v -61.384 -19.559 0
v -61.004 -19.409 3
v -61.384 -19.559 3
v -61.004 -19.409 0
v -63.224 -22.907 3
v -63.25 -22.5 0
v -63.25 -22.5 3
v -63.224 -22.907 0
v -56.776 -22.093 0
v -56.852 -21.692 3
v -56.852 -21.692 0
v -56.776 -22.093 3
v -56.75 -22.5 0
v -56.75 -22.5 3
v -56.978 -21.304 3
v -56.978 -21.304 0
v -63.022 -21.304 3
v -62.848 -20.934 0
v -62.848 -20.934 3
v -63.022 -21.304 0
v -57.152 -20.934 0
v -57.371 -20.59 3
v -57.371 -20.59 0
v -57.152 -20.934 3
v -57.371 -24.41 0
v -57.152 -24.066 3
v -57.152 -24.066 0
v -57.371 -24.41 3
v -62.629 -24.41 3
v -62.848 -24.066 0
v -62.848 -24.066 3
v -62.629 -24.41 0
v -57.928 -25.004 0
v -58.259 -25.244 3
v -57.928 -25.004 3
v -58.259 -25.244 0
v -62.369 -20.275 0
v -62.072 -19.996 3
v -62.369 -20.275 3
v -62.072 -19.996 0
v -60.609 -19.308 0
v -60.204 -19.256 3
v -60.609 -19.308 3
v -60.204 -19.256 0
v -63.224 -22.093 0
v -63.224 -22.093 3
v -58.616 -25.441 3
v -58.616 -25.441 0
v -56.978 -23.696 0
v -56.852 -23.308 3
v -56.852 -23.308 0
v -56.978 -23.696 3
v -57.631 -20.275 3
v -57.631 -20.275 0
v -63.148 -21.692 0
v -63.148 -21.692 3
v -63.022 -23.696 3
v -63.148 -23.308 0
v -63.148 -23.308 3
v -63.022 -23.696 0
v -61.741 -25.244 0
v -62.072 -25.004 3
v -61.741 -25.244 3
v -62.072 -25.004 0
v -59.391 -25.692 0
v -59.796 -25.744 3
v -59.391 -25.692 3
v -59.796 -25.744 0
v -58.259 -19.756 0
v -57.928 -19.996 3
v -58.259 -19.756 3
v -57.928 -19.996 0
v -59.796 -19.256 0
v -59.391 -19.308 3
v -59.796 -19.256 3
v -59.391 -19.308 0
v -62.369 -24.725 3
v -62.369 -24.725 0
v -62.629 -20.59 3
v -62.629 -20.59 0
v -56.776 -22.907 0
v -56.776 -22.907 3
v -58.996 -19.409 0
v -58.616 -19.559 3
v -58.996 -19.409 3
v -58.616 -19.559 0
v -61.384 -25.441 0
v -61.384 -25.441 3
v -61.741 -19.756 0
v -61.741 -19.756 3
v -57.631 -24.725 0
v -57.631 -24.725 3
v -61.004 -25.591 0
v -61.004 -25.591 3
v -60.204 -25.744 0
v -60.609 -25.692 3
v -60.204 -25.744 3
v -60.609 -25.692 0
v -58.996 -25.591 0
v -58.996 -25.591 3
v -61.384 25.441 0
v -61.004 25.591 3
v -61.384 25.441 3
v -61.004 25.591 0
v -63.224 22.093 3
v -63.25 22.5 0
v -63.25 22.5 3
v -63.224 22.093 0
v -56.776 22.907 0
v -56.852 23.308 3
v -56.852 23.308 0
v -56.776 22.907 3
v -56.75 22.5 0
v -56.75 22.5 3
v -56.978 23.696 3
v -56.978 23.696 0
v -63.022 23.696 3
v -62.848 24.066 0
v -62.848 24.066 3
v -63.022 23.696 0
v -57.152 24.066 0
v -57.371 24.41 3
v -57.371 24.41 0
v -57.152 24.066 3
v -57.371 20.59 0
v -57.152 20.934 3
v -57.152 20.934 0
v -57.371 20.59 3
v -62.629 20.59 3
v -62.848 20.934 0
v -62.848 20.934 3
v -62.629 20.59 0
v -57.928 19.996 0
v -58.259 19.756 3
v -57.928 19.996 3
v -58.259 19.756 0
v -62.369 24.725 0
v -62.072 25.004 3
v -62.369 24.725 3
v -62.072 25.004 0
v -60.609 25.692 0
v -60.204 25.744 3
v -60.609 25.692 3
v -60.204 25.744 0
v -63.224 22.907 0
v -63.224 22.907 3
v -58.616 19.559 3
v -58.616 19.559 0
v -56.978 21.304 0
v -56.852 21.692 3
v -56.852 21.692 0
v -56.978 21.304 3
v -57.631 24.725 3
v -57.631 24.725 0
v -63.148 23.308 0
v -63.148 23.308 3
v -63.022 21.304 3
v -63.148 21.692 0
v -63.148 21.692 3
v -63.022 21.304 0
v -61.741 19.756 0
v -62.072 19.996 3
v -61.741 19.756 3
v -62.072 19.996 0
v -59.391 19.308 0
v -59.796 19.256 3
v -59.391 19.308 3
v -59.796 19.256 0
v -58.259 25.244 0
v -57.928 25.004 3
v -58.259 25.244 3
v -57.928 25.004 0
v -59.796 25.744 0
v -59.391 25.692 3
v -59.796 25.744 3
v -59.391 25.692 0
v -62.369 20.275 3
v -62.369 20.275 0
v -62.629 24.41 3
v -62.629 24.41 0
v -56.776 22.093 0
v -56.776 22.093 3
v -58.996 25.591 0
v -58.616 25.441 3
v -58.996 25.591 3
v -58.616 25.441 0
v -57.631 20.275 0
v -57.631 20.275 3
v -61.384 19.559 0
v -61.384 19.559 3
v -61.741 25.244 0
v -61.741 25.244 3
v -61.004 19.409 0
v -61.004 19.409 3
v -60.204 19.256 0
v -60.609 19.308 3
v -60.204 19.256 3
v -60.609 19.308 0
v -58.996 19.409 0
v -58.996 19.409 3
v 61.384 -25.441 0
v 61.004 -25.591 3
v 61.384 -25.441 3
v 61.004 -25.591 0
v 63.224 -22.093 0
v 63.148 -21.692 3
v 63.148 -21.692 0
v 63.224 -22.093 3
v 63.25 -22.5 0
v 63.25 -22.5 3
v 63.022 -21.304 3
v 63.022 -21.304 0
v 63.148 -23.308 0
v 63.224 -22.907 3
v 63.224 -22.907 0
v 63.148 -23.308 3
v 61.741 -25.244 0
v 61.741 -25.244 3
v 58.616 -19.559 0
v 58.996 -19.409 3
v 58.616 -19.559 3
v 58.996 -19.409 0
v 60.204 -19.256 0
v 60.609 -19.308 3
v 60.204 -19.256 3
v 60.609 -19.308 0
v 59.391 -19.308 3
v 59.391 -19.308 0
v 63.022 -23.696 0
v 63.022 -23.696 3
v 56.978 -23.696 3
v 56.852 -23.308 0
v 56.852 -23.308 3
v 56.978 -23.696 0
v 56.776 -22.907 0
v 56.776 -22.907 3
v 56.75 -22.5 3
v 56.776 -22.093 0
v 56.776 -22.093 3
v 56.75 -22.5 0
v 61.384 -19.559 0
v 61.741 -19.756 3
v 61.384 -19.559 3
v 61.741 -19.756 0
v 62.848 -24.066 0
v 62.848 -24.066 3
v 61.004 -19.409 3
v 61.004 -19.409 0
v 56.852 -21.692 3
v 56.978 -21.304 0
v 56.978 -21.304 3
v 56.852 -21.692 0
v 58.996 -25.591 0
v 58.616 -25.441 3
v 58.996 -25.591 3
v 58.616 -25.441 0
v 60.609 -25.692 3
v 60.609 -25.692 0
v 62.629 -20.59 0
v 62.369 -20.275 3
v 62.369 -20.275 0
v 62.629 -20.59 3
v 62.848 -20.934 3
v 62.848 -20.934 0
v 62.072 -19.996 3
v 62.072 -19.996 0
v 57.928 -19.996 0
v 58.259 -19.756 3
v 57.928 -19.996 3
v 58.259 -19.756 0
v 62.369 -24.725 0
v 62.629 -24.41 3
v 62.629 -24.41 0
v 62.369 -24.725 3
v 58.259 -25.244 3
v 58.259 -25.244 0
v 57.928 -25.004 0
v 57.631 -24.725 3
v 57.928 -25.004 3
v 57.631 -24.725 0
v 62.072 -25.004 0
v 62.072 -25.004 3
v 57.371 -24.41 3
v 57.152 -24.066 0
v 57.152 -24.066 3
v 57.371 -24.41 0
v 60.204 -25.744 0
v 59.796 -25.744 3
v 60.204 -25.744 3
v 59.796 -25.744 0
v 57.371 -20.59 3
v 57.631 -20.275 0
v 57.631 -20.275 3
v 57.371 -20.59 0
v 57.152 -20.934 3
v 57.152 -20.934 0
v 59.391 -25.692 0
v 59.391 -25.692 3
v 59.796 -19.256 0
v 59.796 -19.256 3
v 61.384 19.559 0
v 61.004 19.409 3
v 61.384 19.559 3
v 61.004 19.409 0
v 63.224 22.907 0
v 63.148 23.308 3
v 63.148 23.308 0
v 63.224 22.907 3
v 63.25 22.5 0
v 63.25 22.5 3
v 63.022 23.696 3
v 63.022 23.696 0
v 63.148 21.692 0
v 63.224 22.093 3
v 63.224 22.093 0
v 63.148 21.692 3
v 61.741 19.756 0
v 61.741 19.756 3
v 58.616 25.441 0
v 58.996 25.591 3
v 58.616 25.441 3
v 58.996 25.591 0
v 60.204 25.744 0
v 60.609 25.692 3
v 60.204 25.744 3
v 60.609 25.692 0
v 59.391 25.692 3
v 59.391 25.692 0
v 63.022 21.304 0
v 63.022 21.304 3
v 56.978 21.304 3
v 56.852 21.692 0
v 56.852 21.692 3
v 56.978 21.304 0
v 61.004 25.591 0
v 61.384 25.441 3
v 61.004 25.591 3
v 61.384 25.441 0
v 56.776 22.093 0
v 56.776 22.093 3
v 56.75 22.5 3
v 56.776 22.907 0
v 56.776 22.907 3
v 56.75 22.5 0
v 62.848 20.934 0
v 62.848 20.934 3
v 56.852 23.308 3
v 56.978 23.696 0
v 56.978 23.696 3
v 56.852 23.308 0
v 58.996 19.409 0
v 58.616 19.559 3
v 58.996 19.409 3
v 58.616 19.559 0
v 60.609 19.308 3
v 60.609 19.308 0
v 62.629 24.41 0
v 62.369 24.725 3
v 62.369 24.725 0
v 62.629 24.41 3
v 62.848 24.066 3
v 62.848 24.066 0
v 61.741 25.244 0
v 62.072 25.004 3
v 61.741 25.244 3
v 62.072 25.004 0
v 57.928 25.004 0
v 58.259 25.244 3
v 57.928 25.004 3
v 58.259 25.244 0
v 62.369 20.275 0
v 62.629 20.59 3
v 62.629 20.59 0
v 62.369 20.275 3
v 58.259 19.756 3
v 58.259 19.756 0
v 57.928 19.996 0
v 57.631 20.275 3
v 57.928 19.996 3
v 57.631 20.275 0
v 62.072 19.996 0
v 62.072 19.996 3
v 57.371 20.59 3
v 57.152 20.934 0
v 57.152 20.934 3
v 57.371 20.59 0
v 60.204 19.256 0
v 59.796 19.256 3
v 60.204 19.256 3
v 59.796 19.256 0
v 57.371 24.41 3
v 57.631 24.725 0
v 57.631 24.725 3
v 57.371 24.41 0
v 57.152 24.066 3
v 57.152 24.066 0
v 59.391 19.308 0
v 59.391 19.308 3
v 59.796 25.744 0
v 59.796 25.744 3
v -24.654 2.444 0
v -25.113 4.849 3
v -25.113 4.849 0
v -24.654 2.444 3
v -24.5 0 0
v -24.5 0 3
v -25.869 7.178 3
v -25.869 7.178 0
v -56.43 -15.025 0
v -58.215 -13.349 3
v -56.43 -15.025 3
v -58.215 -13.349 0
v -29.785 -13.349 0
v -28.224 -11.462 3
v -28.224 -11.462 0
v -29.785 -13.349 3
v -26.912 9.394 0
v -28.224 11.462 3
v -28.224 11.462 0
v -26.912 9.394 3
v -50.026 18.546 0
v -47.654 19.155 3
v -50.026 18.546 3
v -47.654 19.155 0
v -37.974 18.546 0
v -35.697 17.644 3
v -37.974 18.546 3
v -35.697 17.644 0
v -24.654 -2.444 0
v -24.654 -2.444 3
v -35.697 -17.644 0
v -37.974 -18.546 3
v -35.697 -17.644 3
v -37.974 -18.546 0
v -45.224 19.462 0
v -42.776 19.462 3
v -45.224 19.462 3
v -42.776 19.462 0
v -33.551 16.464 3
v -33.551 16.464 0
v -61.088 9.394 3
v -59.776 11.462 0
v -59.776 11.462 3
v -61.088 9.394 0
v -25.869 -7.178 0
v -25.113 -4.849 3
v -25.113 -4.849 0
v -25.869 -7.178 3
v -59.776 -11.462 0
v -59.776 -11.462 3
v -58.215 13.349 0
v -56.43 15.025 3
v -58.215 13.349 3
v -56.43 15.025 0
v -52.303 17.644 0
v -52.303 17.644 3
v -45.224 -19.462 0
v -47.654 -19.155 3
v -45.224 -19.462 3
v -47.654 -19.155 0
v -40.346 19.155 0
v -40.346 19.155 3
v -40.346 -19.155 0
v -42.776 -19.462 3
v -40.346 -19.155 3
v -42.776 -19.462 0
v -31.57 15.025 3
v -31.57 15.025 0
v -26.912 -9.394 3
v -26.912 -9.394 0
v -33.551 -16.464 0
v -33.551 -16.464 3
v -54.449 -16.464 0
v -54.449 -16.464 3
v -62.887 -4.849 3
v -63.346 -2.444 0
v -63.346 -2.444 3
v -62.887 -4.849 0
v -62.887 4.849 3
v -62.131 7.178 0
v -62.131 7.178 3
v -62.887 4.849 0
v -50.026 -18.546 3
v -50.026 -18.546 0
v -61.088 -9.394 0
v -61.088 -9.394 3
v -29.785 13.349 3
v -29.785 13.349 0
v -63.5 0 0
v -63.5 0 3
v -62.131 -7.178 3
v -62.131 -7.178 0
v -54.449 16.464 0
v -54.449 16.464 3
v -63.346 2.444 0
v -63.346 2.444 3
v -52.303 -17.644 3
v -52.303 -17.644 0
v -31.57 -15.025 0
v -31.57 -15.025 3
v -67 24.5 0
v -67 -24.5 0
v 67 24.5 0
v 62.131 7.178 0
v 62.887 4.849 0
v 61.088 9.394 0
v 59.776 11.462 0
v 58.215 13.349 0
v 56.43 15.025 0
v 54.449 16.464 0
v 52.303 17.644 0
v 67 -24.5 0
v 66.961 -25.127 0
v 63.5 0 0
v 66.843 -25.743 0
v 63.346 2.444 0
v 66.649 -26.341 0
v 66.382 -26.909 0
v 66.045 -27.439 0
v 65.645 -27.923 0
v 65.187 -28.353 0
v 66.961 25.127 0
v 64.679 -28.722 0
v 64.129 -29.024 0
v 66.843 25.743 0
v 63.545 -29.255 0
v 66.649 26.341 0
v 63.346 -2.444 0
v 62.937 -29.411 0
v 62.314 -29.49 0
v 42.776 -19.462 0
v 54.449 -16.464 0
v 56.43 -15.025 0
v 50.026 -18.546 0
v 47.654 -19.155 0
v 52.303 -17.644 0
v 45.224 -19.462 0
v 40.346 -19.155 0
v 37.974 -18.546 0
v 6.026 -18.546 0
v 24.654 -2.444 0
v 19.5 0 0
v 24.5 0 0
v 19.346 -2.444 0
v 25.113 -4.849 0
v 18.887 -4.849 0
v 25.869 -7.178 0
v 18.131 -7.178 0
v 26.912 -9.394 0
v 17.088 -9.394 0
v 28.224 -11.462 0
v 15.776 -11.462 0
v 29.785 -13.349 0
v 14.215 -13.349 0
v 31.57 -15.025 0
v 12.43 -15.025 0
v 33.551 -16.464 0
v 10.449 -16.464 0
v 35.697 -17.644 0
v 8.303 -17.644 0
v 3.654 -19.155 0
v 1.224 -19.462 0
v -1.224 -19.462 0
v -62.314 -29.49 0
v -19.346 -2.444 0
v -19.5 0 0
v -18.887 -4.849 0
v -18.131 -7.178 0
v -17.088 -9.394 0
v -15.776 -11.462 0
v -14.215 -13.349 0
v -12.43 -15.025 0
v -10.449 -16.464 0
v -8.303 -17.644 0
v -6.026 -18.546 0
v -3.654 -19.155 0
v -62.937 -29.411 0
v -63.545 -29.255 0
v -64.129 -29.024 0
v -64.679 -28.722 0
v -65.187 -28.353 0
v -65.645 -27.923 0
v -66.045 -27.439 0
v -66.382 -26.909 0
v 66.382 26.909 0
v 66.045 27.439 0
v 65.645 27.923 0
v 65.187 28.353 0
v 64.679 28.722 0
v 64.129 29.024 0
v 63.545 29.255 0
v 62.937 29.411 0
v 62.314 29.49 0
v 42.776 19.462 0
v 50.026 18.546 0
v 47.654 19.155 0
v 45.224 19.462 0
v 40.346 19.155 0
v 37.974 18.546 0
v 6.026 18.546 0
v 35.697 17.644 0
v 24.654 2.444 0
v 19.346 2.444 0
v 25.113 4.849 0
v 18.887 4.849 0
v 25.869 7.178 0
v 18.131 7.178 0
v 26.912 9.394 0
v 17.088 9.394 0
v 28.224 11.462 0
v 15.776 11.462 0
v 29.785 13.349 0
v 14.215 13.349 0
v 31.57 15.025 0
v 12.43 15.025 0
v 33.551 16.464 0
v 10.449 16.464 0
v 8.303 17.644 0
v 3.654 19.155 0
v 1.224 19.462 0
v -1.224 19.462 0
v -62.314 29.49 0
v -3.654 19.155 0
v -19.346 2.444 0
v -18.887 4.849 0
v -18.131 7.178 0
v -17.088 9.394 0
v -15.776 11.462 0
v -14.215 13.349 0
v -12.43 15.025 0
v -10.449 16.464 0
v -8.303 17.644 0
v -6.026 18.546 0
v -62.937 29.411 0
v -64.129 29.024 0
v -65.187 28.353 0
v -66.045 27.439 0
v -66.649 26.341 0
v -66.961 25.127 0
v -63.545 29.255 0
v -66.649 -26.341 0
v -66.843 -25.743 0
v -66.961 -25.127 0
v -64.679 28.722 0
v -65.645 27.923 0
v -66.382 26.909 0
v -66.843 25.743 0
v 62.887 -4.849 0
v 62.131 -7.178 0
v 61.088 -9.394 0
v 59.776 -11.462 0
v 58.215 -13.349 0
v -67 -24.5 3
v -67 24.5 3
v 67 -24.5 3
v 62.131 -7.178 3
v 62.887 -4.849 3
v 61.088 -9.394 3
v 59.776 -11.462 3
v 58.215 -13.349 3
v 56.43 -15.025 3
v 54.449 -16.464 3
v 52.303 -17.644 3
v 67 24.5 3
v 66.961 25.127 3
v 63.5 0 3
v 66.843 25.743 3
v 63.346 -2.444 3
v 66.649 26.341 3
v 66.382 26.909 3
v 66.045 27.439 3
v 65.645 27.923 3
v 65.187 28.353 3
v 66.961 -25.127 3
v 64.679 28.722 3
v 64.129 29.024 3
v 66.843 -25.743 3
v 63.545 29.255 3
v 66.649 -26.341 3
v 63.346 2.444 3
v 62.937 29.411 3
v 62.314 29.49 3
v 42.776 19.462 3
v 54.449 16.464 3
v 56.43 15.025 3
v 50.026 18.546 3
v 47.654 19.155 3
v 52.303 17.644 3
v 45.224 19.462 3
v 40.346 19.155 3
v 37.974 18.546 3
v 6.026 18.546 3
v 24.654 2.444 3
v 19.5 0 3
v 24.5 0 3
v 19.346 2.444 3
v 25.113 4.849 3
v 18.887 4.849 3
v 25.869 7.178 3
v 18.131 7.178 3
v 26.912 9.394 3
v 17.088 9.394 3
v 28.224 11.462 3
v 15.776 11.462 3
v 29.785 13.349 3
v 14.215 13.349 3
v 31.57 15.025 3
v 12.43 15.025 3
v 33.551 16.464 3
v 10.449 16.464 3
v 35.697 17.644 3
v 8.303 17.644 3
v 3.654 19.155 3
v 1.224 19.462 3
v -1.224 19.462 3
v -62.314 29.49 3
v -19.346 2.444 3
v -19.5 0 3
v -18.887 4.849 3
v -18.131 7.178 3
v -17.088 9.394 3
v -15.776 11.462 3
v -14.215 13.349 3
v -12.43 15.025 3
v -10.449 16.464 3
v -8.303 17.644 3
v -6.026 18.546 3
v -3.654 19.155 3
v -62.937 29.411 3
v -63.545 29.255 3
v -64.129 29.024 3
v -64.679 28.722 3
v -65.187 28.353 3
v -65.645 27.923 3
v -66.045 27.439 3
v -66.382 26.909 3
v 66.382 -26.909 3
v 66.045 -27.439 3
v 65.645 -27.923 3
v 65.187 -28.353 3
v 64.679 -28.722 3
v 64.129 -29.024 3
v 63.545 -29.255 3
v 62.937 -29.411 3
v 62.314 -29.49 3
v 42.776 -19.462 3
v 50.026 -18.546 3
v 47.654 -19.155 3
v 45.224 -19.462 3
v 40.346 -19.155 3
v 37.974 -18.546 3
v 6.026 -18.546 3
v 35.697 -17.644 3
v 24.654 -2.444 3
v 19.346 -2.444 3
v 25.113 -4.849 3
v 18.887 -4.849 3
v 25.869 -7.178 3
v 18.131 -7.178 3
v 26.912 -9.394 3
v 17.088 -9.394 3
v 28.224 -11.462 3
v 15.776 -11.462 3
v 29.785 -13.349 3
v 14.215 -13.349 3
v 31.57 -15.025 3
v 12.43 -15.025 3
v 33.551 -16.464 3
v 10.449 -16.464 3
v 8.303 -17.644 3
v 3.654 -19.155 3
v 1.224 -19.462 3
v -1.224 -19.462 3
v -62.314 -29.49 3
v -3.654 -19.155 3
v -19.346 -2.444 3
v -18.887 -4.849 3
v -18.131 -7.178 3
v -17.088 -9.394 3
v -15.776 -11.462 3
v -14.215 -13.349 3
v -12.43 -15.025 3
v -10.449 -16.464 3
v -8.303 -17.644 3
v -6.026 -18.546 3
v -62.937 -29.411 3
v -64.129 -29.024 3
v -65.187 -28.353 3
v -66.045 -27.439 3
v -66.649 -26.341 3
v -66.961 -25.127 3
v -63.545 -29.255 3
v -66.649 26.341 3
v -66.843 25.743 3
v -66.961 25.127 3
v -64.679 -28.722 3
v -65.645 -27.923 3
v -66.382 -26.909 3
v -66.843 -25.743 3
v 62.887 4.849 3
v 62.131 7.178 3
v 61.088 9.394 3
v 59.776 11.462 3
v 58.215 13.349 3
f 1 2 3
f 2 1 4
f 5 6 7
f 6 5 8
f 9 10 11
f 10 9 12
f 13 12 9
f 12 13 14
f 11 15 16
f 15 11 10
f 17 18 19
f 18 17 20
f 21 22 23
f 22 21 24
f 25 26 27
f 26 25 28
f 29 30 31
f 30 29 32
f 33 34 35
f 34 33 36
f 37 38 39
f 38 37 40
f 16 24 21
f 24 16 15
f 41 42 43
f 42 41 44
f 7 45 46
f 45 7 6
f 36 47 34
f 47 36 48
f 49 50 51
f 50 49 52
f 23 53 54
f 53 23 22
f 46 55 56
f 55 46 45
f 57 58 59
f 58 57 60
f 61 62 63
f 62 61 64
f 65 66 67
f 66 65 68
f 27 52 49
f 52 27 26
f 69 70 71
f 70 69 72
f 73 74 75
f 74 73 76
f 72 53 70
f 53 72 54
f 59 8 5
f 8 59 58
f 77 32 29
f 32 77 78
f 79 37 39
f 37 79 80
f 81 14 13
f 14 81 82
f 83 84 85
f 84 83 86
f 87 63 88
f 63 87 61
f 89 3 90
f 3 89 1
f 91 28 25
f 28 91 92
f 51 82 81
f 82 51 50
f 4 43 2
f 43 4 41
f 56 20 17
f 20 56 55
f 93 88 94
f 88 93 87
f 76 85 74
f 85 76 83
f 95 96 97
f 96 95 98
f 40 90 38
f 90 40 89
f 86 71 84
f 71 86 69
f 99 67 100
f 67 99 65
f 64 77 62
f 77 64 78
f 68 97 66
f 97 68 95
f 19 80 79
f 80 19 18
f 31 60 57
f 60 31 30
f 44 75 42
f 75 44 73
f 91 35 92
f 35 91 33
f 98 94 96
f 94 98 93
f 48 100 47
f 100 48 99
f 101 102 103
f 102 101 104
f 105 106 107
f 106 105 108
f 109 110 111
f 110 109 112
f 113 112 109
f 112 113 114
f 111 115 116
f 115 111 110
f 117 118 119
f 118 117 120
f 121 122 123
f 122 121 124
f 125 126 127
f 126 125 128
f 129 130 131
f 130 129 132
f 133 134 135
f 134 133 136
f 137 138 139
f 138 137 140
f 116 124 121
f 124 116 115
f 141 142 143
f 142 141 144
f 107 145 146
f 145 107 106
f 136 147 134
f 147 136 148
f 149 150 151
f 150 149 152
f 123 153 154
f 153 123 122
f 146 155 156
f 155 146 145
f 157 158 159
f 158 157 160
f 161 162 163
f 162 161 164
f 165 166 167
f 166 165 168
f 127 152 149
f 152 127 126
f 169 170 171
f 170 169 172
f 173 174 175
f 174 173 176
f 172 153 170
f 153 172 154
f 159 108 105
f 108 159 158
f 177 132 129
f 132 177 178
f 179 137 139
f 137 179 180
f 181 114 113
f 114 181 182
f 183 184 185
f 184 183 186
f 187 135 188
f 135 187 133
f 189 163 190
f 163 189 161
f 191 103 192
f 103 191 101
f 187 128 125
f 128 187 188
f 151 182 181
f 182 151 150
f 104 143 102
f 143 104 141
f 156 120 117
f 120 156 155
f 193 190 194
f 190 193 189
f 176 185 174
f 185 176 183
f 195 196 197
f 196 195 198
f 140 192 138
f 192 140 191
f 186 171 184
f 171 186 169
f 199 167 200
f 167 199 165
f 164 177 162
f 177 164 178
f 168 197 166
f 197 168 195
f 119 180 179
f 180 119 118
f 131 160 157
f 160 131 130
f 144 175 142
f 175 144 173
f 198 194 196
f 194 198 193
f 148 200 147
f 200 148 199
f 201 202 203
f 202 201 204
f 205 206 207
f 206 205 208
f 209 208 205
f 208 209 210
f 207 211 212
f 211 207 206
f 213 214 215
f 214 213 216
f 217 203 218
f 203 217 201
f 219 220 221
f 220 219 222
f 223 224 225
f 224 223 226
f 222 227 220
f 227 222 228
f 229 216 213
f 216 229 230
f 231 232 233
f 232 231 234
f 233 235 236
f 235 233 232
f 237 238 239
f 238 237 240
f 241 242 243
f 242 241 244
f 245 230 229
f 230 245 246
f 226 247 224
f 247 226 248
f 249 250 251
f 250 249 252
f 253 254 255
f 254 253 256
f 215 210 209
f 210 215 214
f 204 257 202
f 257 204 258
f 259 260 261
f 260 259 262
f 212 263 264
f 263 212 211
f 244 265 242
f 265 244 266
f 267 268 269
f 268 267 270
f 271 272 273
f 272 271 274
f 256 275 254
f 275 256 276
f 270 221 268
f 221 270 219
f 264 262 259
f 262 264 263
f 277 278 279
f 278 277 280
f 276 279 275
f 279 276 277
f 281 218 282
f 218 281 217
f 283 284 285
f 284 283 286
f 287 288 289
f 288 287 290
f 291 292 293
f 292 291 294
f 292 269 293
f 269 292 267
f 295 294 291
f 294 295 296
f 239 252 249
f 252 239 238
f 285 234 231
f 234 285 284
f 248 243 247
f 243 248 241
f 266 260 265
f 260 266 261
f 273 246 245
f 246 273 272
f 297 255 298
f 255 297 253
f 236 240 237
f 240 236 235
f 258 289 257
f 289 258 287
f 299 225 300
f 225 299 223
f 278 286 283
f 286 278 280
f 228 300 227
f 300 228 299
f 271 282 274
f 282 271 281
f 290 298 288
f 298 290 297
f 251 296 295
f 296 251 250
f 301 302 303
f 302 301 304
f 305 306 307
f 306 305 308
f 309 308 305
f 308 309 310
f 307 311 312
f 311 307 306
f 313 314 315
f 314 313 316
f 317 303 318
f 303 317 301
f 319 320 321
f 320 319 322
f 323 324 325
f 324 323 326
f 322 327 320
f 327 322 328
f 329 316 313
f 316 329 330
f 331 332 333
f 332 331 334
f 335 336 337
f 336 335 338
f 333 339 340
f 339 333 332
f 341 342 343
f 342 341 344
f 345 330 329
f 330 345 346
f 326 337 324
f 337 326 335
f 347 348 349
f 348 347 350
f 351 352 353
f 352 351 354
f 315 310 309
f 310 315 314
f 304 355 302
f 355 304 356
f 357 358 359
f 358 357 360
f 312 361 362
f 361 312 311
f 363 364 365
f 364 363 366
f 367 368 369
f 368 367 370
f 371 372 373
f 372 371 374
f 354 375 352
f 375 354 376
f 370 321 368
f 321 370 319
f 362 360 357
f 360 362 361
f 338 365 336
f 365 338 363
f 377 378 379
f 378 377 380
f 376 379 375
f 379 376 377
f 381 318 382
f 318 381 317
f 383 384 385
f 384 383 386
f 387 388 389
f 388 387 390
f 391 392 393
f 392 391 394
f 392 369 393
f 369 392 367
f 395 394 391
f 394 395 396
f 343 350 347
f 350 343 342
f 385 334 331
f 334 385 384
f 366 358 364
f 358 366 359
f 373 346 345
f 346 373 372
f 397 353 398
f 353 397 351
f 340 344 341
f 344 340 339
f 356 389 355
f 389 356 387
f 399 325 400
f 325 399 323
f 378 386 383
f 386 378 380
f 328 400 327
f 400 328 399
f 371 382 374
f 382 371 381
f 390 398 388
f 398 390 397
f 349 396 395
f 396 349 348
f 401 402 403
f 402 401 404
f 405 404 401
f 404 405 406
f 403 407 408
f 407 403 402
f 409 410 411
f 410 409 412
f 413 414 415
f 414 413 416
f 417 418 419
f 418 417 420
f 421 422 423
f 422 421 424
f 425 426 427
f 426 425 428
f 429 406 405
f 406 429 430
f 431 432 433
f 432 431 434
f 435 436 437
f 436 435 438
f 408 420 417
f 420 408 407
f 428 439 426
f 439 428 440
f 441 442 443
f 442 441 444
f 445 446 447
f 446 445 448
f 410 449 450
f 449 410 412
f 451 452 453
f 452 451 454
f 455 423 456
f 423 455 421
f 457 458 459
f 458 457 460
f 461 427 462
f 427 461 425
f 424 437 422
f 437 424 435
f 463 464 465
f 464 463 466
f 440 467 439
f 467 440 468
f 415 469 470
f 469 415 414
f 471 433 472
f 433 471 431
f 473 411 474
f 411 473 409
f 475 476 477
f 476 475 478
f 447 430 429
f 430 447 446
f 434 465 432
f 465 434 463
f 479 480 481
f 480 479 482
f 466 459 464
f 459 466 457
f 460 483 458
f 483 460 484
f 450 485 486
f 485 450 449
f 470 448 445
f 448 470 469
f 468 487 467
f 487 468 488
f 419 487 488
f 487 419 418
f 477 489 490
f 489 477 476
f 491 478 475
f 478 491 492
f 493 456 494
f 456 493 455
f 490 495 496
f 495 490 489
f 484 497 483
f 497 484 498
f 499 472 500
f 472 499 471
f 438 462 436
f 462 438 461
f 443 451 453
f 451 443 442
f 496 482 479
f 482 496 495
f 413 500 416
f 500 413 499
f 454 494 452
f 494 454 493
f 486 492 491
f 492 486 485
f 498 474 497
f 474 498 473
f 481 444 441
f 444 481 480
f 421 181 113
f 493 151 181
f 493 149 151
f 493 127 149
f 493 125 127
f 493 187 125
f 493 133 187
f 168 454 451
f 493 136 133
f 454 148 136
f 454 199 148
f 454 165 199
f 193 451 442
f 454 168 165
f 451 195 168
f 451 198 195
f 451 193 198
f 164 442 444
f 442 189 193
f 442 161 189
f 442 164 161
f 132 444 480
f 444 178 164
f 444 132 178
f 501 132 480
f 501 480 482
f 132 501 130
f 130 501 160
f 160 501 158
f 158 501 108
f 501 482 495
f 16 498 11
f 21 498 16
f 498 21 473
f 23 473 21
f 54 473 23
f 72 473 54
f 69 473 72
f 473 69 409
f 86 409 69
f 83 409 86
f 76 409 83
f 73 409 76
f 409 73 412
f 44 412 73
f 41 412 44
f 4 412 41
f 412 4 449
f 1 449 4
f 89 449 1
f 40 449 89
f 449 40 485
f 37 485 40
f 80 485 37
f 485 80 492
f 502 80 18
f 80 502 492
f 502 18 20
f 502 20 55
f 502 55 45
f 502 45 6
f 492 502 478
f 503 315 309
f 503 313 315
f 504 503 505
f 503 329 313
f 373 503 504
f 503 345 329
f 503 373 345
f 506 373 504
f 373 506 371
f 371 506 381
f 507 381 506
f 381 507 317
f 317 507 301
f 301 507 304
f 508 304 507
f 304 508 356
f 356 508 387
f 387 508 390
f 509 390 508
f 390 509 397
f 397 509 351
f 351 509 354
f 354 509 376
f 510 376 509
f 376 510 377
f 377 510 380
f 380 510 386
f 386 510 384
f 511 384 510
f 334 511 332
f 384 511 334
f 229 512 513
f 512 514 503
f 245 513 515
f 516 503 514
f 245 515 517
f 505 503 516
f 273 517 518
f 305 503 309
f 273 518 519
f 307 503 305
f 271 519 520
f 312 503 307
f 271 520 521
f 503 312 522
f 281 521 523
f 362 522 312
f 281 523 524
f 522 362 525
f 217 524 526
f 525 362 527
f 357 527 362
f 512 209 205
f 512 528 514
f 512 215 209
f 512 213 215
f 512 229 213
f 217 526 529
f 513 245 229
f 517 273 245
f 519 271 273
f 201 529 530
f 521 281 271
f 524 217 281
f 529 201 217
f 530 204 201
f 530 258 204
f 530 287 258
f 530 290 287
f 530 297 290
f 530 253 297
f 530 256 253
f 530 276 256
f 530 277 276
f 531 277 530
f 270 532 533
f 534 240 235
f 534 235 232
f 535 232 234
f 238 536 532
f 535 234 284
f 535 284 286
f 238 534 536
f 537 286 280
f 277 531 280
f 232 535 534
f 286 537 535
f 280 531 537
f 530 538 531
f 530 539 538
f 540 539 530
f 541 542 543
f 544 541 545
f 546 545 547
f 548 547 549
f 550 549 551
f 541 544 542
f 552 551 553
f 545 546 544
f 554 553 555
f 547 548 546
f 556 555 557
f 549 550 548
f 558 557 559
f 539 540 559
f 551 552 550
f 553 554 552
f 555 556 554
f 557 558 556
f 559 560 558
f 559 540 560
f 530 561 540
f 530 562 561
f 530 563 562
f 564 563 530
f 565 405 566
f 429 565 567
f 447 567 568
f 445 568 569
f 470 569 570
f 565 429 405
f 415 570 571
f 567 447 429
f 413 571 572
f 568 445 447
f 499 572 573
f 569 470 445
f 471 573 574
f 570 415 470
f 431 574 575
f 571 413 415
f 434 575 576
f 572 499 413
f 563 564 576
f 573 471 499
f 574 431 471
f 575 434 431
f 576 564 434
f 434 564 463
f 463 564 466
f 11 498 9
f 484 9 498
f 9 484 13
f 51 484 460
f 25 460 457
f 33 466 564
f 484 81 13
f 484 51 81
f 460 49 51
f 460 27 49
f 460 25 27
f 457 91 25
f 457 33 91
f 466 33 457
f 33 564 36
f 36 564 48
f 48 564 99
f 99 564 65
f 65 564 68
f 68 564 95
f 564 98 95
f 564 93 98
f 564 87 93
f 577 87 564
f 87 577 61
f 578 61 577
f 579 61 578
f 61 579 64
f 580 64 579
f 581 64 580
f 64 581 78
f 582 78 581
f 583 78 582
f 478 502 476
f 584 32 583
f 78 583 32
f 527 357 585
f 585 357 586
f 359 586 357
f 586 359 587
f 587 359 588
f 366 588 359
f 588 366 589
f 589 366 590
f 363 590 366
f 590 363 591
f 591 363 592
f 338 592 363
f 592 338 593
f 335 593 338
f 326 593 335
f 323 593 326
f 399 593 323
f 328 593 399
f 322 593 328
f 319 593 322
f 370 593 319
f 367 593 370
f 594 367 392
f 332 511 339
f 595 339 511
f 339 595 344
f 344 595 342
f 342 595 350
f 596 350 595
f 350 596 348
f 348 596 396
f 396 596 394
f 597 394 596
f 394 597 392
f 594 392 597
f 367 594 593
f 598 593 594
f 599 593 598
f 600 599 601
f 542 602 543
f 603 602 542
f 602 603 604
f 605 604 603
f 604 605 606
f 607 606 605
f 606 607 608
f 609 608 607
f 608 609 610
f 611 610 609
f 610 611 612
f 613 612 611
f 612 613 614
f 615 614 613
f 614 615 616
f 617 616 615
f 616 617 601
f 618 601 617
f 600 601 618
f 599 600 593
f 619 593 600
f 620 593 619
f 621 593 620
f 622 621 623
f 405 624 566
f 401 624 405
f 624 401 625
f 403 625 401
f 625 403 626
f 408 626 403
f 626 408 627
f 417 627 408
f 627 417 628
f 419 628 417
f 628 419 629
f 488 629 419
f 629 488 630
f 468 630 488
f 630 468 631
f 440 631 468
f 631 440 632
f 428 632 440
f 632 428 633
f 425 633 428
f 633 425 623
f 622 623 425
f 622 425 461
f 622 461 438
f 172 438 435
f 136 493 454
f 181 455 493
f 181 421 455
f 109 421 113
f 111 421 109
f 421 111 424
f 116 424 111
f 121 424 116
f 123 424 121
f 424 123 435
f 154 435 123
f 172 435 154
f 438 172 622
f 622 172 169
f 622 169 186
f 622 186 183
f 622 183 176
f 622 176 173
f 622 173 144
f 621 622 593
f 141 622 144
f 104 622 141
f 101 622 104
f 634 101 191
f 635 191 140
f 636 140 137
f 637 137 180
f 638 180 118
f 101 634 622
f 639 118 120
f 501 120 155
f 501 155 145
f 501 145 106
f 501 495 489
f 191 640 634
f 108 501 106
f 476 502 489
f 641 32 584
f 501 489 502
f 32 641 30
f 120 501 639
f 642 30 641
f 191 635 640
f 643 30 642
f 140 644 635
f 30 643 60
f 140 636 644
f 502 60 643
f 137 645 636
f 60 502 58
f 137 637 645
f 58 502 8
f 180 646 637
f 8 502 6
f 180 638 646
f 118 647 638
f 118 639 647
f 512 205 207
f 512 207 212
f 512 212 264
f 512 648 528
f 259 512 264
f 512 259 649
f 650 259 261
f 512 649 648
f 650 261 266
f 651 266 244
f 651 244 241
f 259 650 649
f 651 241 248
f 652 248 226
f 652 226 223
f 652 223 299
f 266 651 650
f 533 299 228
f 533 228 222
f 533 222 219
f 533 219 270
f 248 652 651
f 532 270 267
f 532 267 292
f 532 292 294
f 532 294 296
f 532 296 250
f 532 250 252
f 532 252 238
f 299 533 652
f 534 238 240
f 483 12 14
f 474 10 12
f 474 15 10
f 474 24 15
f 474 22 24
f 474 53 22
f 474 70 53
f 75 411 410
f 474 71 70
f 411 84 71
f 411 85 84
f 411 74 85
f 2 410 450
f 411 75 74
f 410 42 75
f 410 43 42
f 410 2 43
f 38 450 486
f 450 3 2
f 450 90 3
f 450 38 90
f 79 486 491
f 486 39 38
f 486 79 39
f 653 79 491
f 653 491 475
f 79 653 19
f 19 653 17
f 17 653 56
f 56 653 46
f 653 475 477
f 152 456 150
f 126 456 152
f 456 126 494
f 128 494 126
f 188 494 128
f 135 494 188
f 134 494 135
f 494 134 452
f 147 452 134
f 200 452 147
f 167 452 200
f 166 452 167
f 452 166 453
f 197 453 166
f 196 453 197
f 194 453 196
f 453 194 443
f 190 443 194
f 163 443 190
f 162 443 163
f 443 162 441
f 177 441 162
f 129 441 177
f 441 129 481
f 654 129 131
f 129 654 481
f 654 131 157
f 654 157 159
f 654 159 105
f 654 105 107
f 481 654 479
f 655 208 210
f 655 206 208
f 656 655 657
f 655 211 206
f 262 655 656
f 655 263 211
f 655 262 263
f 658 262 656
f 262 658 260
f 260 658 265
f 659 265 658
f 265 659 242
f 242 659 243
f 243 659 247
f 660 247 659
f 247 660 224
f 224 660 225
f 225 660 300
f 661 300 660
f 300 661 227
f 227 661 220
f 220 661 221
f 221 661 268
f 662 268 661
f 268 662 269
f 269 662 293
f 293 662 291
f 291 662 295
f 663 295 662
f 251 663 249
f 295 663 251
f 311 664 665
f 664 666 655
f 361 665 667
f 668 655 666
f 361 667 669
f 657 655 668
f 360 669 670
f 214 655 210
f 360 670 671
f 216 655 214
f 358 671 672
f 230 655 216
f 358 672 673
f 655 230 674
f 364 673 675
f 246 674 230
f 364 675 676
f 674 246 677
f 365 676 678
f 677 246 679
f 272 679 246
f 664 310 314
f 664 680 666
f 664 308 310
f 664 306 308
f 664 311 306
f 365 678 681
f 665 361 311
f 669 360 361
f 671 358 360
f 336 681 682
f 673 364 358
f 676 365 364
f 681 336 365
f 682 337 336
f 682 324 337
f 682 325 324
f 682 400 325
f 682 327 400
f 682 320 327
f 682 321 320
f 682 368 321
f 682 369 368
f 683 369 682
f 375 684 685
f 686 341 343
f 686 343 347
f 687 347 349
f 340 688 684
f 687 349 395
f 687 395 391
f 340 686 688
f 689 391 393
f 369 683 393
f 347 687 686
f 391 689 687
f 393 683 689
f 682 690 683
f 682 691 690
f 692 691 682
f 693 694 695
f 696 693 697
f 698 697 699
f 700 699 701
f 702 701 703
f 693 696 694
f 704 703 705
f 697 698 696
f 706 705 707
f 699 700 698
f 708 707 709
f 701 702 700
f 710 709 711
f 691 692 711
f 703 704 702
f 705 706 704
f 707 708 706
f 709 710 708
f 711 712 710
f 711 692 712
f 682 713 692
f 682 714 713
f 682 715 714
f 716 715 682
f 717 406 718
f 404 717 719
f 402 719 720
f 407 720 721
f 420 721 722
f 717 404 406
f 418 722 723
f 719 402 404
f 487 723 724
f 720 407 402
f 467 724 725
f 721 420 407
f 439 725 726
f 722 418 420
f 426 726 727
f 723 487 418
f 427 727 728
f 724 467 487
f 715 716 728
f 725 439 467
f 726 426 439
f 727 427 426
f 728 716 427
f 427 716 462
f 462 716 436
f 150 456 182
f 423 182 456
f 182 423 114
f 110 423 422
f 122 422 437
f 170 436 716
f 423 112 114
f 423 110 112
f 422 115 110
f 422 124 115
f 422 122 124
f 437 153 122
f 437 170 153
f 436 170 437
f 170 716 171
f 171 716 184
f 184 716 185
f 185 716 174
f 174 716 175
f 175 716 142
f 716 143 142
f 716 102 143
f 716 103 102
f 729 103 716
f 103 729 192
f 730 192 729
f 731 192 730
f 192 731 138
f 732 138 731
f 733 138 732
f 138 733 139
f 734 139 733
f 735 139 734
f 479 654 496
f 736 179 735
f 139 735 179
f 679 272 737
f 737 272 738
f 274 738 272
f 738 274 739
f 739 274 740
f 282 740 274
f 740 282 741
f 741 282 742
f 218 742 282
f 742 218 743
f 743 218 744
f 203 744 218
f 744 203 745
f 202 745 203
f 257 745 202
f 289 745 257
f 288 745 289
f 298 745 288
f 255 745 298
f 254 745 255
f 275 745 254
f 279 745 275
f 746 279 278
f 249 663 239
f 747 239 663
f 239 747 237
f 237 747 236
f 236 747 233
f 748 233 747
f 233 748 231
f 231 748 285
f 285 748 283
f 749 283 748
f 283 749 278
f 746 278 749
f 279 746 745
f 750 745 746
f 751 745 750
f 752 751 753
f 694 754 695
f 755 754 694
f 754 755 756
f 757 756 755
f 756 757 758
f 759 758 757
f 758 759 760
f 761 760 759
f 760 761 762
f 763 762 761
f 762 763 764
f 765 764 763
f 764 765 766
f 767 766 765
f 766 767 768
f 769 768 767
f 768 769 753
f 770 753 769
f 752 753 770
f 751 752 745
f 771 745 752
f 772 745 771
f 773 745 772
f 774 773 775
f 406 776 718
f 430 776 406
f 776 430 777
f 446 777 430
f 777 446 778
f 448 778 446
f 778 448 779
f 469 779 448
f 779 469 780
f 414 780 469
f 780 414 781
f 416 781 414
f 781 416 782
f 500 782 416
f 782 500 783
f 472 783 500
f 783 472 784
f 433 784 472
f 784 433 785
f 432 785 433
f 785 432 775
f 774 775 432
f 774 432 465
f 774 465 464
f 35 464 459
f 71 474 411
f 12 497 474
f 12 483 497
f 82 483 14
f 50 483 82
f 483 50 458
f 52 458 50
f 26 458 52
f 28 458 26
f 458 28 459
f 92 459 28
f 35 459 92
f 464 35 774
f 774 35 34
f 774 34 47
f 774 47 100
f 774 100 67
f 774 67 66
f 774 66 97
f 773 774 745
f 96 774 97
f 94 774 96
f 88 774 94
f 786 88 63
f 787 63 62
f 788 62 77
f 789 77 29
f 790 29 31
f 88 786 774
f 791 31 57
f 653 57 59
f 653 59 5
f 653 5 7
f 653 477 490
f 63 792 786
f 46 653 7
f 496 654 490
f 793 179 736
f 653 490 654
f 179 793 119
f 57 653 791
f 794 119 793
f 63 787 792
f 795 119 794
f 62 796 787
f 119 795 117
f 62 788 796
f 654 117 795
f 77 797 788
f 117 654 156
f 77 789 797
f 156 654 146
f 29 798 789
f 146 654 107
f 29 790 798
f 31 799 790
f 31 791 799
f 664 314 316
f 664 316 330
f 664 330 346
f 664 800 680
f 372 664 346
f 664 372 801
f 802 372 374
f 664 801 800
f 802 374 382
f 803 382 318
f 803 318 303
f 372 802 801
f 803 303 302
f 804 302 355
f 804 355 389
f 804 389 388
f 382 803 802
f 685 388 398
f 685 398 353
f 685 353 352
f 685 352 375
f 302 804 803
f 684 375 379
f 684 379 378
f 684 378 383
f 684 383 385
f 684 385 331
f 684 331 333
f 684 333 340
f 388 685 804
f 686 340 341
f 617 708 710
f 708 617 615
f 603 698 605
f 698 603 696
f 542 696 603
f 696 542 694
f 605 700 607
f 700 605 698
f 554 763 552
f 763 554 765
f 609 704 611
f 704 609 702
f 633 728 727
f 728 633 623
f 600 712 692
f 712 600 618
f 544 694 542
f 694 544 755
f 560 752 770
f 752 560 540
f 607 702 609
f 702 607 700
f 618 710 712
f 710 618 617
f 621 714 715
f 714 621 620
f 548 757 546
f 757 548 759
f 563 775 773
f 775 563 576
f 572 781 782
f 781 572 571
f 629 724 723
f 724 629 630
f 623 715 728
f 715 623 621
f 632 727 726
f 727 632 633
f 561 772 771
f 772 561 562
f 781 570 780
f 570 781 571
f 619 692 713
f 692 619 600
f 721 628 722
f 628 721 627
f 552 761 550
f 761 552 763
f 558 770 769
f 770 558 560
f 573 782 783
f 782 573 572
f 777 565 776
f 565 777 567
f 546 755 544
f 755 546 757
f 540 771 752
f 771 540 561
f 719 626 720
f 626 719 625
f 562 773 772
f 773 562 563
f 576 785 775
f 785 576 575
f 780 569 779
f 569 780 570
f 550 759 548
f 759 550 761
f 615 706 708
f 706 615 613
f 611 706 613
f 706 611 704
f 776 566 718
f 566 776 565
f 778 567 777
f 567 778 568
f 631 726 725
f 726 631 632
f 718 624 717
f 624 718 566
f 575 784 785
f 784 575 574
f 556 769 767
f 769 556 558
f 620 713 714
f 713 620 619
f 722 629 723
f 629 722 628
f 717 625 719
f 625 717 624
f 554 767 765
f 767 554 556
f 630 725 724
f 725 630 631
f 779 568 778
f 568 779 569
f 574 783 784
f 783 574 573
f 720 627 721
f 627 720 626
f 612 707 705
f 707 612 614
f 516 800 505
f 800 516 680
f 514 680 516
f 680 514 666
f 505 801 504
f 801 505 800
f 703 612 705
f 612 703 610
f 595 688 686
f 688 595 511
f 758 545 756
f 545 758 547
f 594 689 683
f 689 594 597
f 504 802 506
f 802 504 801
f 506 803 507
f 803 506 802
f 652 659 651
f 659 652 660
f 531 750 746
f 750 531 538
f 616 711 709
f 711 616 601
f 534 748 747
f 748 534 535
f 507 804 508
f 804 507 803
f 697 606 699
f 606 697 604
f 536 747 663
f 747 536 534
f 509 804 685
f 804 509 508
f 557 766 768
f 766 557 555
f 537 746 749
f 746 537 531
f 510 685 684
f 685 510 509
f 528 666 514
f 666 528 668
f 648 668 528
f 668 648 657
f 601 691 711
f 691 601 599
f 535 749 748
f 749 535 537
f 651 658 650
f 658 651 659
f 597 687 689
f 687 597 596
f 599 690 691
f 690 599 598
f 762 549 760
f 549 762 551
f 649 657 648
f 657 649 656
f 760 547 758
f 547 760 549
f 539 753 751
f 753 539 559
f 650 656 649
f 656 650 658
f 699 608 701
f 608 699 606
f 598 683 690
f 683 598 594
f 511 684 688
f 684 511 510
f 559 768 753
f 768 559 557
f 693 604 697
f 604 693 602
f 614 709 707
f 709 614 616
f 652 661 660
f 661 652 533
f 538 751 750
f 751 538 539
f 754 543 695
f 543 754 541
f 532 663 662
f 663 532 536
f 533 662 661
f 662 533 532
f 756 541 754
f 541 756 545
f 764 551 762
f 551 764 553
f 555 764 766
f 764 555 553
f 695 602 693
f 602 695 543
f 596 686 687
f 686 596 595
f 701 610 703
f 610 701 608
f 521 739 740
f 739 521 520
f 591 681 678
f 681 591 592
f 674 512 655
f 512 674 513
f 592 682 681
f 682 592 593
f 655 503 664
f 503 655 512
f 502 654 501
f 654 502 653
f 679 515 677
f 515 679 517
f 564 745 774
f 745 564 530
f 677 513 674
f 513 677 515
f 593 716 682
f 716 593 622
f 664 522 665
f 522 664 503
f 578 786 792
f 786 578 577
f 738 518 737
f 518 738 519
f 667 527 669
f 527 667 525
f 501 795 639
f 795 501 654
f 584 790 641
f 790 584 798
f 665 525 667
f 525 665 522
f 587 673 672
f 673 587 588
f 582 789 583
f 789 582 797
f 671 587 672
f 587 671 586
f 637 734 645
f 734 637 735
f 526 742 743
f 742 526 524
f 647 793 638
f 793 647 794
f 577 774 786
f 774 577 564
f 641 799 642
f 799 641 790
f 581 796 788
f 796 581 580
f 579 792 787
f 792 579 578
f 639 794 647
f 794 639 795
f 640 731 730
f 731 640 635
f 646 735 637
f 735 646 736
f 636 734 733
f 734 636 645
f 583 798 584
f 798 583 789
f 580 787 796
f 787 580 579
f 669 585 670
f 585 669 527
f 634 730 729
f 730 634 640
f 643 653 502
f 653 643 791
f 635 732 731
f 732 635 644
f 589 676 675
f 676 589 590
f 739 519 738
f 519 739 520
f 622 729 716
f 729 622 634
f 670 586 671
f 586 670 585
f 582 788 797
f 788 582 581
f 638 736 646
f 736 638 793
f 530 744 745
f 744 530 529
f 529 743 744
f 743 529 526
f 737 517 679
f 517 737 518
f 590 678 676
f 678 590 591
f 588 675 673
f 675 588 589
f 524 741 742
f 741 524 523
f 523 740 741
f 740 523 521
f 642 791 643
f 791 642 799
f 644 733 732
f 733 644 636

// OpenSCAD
$fn = 50;


difference() {
	union() {
		hull() {
			translate(v = [-62.0000000000, 24.5000000000, 0]) {
				cylinder(h = 3, r = 5);
			}
			translate(v = [62.0000000000, 24.5000000000, 0]) {
				cylinder(h = 3, r = 5);
			}
			translate(v = [-62.0000000000, -24.5000000000, 0]) {
				cylinder(h = 3, r = 5);
			}
			translate(v = [62.0000000000, -24.5000000000, 0]) {
				cylinder(h = 3, r = 5);
			}
		}
	}
	union() {
		#translate(v = [-60.0000000000, -22.5000000000, -100.0000000000]) {
			cylinder(h = 200, r = 3.2500000000);
		}
		#translate(v = [-60.0000000000, 22.5000000000, -100.0000000000]) {
			cylinder(h = 200, r = 3.2500000000);
		}
		#translate(v = [60.0000000000, -22.5000000000, -100.0000000000]) {
			cylinder(h = 200, r = 3.2500000000);
		}
		#translate(v = [60.0000000000, 22.5000000000, -100.0000000000]) {
			cylinder(h = 200, r = 3.2500000000);
		}
		#translate(v = [-44.0000000000, 0, 0]) {
			cylinder(h = 3, r = 19.5000000000);
		}
		#cylinder(h = 3, r = 19.5000000000);
		#translate(v = [44.0000000000, 0, 0]) {
			cylinder(h = 3, r = 19.5000000000);
		}
	}
}
